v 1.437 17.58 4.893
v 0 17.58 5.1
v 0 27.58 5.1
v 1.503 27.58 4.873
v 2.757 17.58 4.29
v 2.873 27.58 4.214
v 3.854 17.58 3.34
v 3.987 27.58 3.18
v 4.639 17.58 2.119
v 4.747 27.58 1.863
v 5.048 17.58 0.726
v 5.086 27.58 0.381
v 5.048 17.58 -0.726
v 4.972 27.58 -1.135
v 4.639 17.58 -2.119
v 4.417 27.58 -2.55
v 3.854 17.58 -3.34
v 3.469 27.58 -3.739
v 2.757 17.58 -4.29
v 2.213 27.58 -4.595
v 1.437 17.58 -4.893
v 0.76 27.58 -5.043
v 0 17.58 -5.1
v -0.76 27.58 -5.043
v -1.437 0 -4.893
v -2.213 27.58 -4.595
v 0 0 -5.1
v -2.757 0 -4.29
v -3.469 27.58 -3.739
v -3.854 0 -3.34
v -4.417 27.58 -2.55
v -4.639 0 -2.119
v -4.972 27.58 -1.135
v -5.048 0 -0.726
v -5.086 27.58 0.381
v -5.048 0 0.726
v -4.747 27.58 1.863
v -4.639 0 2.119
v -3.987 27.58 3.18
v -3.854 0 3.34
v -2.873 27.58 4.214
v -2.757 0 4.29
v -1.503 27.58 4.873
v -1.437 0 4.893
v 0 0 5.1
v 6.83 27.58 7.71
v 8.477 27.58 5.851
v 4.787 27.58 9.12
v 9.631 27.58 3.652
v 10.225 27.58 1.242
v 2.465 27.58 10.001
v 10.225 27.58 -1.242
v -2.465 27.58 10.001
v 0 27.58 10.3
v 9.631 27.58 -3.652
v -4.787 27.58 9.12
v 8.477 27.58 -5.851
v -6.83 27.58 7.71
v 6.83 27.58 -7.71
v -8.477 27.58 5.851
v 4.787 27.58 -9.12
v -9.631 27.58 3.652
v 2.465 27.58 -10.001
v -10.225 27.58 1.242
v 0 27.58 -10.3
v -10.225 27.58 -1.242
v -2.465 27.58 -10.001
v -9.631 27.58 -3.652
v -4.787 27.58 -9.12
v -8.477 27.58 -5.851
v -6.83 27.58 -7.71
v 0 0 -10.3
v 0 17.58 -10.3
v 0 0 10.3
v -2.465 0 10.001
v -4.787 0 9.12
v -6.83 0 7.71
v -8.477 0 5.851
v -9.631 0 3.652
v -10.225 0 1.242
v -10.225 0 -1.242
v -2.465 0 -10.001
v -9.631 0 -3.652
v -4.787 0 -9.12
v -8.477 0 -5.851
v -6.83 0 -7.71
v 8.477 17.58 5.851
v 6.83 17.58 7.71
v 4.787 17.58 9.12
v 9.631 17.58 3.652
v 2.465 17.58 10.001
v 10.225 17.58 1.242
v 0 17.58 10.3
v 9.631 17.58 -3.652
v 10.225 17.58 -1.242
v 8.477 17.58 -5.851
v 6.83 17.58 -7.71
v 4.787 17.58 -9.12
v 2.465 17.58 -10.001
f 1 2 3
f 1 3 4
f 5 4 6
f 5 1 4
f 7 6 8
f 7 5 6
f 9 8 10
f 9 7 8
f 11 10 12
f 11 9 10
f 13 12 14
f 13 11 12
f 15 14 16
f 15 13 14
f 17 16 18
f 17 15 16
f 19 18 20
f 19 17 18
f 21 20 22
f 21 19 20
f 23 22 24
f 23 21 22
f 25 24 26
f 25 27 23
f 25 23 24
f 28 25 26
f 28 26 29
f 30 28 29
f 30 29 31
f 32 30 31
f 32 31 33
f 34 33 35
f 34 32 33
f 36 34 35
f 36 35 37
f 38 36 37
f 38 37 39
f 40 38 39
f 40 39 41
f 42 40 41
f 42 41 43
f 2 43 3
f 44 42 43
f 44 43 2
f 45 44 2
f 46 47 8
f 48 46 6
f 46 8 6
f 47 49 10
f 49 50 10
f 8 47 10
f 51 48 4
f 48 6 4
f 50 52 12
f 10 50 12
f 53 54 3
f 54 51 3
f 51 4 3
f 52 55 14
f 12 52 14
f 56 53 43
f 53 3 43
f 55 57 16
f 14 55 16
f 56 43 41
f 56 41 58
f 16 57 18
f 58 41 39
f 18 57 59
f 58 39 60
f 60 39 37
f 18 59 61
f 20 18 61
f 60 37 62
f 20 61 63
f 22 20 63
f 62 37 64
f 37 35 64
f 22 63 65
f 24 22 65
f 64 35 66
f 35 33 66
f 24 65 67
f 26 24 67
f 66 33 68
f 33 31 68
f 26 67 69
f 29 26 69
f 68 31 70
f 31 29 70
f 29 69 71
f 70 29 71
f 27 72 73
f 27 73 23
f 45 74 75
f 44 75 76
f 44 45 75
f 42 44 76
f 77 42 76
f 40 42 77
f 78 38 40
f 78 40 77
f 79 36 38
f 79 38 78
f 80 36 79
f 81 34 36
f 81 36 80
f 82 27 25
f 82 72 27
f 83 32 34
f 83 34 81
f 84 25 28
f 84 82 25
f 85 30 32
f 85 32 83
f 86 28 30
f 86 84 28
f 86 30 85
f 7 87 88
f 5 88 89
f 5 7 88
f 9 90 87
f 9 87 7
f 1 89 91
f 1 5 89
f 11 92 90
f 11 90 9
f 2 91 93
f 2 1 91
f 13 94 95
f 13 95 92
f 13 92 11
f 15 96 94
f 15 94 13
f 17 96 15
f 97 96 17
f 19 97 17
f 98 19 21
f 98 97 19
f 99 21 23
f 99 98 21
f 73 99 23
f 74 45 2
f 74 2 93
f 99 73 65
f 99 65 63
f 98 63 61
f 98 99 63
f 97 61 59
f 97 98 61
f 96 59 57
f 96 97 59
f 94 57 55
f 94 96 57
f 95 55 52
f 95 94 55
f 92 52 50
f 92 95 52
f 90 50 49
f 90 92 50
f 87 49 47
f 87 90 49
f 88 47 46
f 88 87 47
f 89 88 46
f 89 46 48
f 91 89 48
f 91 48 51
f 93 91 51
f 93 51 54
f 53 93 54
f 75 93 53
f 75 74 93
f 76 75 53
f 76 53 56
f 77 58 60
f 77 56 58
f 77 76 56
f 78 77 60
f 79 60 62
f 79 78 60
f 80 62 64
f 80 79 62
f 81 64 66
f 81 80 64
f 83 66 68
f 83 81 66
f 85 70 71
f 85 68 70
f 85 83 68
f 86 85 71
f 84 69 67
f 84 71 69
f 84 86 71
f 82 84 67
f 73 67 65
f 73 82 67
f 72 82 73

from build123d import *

# Parameters (mm, degrees)
EXTRUDE_1_DEPTH = 27.58
EXTRUDE_START   = -10
EXTRUDE_2_DEPTH = 10


with BuildPart() as part:
    # 草圖1 → 伸長-薄件1 (new body)
    with BuildSketch(Plane(origin=(0, 0, 0), x_dir=(1, 0, 0), z_dir=(0, 1, 0))):
        with BuildLine():
            ThreePointArc((0, 5.1), (-5.1, 0), (0, -5.1))
            Line((0, -5.1), (0, -10.3))
            ThreePointArc((0, -10.3), (-10.3, 0), (0, 10.3))
            Line((0, 10.3), (0, 5.1))
        make_face()
    extrude(amount=EXTRUDE_1_DEPTH)

    # 草圖3 → 伸長-薄件2 (add)
    with BuildSketch(Plane(origin=(0, 27.58, 0), x_dir=(1, 0, 0), z_dir=(0, 1, 0)).offset(EXTRUDE_START)):
        with BuildLine():
            ThreePointArc((0, -5.1), (5.1, 0), (0, 5.1))
            Line((0, 5.1), (0, 10.3))
            ThreePointArc((0, 10.3), (10.3, 0), (0, -10.3))
            Line((0, -10.3), (0, -5.1))
        make_face()
    extrude(amount=EXTRUDE_2_DEPTH)


solid = part.part
